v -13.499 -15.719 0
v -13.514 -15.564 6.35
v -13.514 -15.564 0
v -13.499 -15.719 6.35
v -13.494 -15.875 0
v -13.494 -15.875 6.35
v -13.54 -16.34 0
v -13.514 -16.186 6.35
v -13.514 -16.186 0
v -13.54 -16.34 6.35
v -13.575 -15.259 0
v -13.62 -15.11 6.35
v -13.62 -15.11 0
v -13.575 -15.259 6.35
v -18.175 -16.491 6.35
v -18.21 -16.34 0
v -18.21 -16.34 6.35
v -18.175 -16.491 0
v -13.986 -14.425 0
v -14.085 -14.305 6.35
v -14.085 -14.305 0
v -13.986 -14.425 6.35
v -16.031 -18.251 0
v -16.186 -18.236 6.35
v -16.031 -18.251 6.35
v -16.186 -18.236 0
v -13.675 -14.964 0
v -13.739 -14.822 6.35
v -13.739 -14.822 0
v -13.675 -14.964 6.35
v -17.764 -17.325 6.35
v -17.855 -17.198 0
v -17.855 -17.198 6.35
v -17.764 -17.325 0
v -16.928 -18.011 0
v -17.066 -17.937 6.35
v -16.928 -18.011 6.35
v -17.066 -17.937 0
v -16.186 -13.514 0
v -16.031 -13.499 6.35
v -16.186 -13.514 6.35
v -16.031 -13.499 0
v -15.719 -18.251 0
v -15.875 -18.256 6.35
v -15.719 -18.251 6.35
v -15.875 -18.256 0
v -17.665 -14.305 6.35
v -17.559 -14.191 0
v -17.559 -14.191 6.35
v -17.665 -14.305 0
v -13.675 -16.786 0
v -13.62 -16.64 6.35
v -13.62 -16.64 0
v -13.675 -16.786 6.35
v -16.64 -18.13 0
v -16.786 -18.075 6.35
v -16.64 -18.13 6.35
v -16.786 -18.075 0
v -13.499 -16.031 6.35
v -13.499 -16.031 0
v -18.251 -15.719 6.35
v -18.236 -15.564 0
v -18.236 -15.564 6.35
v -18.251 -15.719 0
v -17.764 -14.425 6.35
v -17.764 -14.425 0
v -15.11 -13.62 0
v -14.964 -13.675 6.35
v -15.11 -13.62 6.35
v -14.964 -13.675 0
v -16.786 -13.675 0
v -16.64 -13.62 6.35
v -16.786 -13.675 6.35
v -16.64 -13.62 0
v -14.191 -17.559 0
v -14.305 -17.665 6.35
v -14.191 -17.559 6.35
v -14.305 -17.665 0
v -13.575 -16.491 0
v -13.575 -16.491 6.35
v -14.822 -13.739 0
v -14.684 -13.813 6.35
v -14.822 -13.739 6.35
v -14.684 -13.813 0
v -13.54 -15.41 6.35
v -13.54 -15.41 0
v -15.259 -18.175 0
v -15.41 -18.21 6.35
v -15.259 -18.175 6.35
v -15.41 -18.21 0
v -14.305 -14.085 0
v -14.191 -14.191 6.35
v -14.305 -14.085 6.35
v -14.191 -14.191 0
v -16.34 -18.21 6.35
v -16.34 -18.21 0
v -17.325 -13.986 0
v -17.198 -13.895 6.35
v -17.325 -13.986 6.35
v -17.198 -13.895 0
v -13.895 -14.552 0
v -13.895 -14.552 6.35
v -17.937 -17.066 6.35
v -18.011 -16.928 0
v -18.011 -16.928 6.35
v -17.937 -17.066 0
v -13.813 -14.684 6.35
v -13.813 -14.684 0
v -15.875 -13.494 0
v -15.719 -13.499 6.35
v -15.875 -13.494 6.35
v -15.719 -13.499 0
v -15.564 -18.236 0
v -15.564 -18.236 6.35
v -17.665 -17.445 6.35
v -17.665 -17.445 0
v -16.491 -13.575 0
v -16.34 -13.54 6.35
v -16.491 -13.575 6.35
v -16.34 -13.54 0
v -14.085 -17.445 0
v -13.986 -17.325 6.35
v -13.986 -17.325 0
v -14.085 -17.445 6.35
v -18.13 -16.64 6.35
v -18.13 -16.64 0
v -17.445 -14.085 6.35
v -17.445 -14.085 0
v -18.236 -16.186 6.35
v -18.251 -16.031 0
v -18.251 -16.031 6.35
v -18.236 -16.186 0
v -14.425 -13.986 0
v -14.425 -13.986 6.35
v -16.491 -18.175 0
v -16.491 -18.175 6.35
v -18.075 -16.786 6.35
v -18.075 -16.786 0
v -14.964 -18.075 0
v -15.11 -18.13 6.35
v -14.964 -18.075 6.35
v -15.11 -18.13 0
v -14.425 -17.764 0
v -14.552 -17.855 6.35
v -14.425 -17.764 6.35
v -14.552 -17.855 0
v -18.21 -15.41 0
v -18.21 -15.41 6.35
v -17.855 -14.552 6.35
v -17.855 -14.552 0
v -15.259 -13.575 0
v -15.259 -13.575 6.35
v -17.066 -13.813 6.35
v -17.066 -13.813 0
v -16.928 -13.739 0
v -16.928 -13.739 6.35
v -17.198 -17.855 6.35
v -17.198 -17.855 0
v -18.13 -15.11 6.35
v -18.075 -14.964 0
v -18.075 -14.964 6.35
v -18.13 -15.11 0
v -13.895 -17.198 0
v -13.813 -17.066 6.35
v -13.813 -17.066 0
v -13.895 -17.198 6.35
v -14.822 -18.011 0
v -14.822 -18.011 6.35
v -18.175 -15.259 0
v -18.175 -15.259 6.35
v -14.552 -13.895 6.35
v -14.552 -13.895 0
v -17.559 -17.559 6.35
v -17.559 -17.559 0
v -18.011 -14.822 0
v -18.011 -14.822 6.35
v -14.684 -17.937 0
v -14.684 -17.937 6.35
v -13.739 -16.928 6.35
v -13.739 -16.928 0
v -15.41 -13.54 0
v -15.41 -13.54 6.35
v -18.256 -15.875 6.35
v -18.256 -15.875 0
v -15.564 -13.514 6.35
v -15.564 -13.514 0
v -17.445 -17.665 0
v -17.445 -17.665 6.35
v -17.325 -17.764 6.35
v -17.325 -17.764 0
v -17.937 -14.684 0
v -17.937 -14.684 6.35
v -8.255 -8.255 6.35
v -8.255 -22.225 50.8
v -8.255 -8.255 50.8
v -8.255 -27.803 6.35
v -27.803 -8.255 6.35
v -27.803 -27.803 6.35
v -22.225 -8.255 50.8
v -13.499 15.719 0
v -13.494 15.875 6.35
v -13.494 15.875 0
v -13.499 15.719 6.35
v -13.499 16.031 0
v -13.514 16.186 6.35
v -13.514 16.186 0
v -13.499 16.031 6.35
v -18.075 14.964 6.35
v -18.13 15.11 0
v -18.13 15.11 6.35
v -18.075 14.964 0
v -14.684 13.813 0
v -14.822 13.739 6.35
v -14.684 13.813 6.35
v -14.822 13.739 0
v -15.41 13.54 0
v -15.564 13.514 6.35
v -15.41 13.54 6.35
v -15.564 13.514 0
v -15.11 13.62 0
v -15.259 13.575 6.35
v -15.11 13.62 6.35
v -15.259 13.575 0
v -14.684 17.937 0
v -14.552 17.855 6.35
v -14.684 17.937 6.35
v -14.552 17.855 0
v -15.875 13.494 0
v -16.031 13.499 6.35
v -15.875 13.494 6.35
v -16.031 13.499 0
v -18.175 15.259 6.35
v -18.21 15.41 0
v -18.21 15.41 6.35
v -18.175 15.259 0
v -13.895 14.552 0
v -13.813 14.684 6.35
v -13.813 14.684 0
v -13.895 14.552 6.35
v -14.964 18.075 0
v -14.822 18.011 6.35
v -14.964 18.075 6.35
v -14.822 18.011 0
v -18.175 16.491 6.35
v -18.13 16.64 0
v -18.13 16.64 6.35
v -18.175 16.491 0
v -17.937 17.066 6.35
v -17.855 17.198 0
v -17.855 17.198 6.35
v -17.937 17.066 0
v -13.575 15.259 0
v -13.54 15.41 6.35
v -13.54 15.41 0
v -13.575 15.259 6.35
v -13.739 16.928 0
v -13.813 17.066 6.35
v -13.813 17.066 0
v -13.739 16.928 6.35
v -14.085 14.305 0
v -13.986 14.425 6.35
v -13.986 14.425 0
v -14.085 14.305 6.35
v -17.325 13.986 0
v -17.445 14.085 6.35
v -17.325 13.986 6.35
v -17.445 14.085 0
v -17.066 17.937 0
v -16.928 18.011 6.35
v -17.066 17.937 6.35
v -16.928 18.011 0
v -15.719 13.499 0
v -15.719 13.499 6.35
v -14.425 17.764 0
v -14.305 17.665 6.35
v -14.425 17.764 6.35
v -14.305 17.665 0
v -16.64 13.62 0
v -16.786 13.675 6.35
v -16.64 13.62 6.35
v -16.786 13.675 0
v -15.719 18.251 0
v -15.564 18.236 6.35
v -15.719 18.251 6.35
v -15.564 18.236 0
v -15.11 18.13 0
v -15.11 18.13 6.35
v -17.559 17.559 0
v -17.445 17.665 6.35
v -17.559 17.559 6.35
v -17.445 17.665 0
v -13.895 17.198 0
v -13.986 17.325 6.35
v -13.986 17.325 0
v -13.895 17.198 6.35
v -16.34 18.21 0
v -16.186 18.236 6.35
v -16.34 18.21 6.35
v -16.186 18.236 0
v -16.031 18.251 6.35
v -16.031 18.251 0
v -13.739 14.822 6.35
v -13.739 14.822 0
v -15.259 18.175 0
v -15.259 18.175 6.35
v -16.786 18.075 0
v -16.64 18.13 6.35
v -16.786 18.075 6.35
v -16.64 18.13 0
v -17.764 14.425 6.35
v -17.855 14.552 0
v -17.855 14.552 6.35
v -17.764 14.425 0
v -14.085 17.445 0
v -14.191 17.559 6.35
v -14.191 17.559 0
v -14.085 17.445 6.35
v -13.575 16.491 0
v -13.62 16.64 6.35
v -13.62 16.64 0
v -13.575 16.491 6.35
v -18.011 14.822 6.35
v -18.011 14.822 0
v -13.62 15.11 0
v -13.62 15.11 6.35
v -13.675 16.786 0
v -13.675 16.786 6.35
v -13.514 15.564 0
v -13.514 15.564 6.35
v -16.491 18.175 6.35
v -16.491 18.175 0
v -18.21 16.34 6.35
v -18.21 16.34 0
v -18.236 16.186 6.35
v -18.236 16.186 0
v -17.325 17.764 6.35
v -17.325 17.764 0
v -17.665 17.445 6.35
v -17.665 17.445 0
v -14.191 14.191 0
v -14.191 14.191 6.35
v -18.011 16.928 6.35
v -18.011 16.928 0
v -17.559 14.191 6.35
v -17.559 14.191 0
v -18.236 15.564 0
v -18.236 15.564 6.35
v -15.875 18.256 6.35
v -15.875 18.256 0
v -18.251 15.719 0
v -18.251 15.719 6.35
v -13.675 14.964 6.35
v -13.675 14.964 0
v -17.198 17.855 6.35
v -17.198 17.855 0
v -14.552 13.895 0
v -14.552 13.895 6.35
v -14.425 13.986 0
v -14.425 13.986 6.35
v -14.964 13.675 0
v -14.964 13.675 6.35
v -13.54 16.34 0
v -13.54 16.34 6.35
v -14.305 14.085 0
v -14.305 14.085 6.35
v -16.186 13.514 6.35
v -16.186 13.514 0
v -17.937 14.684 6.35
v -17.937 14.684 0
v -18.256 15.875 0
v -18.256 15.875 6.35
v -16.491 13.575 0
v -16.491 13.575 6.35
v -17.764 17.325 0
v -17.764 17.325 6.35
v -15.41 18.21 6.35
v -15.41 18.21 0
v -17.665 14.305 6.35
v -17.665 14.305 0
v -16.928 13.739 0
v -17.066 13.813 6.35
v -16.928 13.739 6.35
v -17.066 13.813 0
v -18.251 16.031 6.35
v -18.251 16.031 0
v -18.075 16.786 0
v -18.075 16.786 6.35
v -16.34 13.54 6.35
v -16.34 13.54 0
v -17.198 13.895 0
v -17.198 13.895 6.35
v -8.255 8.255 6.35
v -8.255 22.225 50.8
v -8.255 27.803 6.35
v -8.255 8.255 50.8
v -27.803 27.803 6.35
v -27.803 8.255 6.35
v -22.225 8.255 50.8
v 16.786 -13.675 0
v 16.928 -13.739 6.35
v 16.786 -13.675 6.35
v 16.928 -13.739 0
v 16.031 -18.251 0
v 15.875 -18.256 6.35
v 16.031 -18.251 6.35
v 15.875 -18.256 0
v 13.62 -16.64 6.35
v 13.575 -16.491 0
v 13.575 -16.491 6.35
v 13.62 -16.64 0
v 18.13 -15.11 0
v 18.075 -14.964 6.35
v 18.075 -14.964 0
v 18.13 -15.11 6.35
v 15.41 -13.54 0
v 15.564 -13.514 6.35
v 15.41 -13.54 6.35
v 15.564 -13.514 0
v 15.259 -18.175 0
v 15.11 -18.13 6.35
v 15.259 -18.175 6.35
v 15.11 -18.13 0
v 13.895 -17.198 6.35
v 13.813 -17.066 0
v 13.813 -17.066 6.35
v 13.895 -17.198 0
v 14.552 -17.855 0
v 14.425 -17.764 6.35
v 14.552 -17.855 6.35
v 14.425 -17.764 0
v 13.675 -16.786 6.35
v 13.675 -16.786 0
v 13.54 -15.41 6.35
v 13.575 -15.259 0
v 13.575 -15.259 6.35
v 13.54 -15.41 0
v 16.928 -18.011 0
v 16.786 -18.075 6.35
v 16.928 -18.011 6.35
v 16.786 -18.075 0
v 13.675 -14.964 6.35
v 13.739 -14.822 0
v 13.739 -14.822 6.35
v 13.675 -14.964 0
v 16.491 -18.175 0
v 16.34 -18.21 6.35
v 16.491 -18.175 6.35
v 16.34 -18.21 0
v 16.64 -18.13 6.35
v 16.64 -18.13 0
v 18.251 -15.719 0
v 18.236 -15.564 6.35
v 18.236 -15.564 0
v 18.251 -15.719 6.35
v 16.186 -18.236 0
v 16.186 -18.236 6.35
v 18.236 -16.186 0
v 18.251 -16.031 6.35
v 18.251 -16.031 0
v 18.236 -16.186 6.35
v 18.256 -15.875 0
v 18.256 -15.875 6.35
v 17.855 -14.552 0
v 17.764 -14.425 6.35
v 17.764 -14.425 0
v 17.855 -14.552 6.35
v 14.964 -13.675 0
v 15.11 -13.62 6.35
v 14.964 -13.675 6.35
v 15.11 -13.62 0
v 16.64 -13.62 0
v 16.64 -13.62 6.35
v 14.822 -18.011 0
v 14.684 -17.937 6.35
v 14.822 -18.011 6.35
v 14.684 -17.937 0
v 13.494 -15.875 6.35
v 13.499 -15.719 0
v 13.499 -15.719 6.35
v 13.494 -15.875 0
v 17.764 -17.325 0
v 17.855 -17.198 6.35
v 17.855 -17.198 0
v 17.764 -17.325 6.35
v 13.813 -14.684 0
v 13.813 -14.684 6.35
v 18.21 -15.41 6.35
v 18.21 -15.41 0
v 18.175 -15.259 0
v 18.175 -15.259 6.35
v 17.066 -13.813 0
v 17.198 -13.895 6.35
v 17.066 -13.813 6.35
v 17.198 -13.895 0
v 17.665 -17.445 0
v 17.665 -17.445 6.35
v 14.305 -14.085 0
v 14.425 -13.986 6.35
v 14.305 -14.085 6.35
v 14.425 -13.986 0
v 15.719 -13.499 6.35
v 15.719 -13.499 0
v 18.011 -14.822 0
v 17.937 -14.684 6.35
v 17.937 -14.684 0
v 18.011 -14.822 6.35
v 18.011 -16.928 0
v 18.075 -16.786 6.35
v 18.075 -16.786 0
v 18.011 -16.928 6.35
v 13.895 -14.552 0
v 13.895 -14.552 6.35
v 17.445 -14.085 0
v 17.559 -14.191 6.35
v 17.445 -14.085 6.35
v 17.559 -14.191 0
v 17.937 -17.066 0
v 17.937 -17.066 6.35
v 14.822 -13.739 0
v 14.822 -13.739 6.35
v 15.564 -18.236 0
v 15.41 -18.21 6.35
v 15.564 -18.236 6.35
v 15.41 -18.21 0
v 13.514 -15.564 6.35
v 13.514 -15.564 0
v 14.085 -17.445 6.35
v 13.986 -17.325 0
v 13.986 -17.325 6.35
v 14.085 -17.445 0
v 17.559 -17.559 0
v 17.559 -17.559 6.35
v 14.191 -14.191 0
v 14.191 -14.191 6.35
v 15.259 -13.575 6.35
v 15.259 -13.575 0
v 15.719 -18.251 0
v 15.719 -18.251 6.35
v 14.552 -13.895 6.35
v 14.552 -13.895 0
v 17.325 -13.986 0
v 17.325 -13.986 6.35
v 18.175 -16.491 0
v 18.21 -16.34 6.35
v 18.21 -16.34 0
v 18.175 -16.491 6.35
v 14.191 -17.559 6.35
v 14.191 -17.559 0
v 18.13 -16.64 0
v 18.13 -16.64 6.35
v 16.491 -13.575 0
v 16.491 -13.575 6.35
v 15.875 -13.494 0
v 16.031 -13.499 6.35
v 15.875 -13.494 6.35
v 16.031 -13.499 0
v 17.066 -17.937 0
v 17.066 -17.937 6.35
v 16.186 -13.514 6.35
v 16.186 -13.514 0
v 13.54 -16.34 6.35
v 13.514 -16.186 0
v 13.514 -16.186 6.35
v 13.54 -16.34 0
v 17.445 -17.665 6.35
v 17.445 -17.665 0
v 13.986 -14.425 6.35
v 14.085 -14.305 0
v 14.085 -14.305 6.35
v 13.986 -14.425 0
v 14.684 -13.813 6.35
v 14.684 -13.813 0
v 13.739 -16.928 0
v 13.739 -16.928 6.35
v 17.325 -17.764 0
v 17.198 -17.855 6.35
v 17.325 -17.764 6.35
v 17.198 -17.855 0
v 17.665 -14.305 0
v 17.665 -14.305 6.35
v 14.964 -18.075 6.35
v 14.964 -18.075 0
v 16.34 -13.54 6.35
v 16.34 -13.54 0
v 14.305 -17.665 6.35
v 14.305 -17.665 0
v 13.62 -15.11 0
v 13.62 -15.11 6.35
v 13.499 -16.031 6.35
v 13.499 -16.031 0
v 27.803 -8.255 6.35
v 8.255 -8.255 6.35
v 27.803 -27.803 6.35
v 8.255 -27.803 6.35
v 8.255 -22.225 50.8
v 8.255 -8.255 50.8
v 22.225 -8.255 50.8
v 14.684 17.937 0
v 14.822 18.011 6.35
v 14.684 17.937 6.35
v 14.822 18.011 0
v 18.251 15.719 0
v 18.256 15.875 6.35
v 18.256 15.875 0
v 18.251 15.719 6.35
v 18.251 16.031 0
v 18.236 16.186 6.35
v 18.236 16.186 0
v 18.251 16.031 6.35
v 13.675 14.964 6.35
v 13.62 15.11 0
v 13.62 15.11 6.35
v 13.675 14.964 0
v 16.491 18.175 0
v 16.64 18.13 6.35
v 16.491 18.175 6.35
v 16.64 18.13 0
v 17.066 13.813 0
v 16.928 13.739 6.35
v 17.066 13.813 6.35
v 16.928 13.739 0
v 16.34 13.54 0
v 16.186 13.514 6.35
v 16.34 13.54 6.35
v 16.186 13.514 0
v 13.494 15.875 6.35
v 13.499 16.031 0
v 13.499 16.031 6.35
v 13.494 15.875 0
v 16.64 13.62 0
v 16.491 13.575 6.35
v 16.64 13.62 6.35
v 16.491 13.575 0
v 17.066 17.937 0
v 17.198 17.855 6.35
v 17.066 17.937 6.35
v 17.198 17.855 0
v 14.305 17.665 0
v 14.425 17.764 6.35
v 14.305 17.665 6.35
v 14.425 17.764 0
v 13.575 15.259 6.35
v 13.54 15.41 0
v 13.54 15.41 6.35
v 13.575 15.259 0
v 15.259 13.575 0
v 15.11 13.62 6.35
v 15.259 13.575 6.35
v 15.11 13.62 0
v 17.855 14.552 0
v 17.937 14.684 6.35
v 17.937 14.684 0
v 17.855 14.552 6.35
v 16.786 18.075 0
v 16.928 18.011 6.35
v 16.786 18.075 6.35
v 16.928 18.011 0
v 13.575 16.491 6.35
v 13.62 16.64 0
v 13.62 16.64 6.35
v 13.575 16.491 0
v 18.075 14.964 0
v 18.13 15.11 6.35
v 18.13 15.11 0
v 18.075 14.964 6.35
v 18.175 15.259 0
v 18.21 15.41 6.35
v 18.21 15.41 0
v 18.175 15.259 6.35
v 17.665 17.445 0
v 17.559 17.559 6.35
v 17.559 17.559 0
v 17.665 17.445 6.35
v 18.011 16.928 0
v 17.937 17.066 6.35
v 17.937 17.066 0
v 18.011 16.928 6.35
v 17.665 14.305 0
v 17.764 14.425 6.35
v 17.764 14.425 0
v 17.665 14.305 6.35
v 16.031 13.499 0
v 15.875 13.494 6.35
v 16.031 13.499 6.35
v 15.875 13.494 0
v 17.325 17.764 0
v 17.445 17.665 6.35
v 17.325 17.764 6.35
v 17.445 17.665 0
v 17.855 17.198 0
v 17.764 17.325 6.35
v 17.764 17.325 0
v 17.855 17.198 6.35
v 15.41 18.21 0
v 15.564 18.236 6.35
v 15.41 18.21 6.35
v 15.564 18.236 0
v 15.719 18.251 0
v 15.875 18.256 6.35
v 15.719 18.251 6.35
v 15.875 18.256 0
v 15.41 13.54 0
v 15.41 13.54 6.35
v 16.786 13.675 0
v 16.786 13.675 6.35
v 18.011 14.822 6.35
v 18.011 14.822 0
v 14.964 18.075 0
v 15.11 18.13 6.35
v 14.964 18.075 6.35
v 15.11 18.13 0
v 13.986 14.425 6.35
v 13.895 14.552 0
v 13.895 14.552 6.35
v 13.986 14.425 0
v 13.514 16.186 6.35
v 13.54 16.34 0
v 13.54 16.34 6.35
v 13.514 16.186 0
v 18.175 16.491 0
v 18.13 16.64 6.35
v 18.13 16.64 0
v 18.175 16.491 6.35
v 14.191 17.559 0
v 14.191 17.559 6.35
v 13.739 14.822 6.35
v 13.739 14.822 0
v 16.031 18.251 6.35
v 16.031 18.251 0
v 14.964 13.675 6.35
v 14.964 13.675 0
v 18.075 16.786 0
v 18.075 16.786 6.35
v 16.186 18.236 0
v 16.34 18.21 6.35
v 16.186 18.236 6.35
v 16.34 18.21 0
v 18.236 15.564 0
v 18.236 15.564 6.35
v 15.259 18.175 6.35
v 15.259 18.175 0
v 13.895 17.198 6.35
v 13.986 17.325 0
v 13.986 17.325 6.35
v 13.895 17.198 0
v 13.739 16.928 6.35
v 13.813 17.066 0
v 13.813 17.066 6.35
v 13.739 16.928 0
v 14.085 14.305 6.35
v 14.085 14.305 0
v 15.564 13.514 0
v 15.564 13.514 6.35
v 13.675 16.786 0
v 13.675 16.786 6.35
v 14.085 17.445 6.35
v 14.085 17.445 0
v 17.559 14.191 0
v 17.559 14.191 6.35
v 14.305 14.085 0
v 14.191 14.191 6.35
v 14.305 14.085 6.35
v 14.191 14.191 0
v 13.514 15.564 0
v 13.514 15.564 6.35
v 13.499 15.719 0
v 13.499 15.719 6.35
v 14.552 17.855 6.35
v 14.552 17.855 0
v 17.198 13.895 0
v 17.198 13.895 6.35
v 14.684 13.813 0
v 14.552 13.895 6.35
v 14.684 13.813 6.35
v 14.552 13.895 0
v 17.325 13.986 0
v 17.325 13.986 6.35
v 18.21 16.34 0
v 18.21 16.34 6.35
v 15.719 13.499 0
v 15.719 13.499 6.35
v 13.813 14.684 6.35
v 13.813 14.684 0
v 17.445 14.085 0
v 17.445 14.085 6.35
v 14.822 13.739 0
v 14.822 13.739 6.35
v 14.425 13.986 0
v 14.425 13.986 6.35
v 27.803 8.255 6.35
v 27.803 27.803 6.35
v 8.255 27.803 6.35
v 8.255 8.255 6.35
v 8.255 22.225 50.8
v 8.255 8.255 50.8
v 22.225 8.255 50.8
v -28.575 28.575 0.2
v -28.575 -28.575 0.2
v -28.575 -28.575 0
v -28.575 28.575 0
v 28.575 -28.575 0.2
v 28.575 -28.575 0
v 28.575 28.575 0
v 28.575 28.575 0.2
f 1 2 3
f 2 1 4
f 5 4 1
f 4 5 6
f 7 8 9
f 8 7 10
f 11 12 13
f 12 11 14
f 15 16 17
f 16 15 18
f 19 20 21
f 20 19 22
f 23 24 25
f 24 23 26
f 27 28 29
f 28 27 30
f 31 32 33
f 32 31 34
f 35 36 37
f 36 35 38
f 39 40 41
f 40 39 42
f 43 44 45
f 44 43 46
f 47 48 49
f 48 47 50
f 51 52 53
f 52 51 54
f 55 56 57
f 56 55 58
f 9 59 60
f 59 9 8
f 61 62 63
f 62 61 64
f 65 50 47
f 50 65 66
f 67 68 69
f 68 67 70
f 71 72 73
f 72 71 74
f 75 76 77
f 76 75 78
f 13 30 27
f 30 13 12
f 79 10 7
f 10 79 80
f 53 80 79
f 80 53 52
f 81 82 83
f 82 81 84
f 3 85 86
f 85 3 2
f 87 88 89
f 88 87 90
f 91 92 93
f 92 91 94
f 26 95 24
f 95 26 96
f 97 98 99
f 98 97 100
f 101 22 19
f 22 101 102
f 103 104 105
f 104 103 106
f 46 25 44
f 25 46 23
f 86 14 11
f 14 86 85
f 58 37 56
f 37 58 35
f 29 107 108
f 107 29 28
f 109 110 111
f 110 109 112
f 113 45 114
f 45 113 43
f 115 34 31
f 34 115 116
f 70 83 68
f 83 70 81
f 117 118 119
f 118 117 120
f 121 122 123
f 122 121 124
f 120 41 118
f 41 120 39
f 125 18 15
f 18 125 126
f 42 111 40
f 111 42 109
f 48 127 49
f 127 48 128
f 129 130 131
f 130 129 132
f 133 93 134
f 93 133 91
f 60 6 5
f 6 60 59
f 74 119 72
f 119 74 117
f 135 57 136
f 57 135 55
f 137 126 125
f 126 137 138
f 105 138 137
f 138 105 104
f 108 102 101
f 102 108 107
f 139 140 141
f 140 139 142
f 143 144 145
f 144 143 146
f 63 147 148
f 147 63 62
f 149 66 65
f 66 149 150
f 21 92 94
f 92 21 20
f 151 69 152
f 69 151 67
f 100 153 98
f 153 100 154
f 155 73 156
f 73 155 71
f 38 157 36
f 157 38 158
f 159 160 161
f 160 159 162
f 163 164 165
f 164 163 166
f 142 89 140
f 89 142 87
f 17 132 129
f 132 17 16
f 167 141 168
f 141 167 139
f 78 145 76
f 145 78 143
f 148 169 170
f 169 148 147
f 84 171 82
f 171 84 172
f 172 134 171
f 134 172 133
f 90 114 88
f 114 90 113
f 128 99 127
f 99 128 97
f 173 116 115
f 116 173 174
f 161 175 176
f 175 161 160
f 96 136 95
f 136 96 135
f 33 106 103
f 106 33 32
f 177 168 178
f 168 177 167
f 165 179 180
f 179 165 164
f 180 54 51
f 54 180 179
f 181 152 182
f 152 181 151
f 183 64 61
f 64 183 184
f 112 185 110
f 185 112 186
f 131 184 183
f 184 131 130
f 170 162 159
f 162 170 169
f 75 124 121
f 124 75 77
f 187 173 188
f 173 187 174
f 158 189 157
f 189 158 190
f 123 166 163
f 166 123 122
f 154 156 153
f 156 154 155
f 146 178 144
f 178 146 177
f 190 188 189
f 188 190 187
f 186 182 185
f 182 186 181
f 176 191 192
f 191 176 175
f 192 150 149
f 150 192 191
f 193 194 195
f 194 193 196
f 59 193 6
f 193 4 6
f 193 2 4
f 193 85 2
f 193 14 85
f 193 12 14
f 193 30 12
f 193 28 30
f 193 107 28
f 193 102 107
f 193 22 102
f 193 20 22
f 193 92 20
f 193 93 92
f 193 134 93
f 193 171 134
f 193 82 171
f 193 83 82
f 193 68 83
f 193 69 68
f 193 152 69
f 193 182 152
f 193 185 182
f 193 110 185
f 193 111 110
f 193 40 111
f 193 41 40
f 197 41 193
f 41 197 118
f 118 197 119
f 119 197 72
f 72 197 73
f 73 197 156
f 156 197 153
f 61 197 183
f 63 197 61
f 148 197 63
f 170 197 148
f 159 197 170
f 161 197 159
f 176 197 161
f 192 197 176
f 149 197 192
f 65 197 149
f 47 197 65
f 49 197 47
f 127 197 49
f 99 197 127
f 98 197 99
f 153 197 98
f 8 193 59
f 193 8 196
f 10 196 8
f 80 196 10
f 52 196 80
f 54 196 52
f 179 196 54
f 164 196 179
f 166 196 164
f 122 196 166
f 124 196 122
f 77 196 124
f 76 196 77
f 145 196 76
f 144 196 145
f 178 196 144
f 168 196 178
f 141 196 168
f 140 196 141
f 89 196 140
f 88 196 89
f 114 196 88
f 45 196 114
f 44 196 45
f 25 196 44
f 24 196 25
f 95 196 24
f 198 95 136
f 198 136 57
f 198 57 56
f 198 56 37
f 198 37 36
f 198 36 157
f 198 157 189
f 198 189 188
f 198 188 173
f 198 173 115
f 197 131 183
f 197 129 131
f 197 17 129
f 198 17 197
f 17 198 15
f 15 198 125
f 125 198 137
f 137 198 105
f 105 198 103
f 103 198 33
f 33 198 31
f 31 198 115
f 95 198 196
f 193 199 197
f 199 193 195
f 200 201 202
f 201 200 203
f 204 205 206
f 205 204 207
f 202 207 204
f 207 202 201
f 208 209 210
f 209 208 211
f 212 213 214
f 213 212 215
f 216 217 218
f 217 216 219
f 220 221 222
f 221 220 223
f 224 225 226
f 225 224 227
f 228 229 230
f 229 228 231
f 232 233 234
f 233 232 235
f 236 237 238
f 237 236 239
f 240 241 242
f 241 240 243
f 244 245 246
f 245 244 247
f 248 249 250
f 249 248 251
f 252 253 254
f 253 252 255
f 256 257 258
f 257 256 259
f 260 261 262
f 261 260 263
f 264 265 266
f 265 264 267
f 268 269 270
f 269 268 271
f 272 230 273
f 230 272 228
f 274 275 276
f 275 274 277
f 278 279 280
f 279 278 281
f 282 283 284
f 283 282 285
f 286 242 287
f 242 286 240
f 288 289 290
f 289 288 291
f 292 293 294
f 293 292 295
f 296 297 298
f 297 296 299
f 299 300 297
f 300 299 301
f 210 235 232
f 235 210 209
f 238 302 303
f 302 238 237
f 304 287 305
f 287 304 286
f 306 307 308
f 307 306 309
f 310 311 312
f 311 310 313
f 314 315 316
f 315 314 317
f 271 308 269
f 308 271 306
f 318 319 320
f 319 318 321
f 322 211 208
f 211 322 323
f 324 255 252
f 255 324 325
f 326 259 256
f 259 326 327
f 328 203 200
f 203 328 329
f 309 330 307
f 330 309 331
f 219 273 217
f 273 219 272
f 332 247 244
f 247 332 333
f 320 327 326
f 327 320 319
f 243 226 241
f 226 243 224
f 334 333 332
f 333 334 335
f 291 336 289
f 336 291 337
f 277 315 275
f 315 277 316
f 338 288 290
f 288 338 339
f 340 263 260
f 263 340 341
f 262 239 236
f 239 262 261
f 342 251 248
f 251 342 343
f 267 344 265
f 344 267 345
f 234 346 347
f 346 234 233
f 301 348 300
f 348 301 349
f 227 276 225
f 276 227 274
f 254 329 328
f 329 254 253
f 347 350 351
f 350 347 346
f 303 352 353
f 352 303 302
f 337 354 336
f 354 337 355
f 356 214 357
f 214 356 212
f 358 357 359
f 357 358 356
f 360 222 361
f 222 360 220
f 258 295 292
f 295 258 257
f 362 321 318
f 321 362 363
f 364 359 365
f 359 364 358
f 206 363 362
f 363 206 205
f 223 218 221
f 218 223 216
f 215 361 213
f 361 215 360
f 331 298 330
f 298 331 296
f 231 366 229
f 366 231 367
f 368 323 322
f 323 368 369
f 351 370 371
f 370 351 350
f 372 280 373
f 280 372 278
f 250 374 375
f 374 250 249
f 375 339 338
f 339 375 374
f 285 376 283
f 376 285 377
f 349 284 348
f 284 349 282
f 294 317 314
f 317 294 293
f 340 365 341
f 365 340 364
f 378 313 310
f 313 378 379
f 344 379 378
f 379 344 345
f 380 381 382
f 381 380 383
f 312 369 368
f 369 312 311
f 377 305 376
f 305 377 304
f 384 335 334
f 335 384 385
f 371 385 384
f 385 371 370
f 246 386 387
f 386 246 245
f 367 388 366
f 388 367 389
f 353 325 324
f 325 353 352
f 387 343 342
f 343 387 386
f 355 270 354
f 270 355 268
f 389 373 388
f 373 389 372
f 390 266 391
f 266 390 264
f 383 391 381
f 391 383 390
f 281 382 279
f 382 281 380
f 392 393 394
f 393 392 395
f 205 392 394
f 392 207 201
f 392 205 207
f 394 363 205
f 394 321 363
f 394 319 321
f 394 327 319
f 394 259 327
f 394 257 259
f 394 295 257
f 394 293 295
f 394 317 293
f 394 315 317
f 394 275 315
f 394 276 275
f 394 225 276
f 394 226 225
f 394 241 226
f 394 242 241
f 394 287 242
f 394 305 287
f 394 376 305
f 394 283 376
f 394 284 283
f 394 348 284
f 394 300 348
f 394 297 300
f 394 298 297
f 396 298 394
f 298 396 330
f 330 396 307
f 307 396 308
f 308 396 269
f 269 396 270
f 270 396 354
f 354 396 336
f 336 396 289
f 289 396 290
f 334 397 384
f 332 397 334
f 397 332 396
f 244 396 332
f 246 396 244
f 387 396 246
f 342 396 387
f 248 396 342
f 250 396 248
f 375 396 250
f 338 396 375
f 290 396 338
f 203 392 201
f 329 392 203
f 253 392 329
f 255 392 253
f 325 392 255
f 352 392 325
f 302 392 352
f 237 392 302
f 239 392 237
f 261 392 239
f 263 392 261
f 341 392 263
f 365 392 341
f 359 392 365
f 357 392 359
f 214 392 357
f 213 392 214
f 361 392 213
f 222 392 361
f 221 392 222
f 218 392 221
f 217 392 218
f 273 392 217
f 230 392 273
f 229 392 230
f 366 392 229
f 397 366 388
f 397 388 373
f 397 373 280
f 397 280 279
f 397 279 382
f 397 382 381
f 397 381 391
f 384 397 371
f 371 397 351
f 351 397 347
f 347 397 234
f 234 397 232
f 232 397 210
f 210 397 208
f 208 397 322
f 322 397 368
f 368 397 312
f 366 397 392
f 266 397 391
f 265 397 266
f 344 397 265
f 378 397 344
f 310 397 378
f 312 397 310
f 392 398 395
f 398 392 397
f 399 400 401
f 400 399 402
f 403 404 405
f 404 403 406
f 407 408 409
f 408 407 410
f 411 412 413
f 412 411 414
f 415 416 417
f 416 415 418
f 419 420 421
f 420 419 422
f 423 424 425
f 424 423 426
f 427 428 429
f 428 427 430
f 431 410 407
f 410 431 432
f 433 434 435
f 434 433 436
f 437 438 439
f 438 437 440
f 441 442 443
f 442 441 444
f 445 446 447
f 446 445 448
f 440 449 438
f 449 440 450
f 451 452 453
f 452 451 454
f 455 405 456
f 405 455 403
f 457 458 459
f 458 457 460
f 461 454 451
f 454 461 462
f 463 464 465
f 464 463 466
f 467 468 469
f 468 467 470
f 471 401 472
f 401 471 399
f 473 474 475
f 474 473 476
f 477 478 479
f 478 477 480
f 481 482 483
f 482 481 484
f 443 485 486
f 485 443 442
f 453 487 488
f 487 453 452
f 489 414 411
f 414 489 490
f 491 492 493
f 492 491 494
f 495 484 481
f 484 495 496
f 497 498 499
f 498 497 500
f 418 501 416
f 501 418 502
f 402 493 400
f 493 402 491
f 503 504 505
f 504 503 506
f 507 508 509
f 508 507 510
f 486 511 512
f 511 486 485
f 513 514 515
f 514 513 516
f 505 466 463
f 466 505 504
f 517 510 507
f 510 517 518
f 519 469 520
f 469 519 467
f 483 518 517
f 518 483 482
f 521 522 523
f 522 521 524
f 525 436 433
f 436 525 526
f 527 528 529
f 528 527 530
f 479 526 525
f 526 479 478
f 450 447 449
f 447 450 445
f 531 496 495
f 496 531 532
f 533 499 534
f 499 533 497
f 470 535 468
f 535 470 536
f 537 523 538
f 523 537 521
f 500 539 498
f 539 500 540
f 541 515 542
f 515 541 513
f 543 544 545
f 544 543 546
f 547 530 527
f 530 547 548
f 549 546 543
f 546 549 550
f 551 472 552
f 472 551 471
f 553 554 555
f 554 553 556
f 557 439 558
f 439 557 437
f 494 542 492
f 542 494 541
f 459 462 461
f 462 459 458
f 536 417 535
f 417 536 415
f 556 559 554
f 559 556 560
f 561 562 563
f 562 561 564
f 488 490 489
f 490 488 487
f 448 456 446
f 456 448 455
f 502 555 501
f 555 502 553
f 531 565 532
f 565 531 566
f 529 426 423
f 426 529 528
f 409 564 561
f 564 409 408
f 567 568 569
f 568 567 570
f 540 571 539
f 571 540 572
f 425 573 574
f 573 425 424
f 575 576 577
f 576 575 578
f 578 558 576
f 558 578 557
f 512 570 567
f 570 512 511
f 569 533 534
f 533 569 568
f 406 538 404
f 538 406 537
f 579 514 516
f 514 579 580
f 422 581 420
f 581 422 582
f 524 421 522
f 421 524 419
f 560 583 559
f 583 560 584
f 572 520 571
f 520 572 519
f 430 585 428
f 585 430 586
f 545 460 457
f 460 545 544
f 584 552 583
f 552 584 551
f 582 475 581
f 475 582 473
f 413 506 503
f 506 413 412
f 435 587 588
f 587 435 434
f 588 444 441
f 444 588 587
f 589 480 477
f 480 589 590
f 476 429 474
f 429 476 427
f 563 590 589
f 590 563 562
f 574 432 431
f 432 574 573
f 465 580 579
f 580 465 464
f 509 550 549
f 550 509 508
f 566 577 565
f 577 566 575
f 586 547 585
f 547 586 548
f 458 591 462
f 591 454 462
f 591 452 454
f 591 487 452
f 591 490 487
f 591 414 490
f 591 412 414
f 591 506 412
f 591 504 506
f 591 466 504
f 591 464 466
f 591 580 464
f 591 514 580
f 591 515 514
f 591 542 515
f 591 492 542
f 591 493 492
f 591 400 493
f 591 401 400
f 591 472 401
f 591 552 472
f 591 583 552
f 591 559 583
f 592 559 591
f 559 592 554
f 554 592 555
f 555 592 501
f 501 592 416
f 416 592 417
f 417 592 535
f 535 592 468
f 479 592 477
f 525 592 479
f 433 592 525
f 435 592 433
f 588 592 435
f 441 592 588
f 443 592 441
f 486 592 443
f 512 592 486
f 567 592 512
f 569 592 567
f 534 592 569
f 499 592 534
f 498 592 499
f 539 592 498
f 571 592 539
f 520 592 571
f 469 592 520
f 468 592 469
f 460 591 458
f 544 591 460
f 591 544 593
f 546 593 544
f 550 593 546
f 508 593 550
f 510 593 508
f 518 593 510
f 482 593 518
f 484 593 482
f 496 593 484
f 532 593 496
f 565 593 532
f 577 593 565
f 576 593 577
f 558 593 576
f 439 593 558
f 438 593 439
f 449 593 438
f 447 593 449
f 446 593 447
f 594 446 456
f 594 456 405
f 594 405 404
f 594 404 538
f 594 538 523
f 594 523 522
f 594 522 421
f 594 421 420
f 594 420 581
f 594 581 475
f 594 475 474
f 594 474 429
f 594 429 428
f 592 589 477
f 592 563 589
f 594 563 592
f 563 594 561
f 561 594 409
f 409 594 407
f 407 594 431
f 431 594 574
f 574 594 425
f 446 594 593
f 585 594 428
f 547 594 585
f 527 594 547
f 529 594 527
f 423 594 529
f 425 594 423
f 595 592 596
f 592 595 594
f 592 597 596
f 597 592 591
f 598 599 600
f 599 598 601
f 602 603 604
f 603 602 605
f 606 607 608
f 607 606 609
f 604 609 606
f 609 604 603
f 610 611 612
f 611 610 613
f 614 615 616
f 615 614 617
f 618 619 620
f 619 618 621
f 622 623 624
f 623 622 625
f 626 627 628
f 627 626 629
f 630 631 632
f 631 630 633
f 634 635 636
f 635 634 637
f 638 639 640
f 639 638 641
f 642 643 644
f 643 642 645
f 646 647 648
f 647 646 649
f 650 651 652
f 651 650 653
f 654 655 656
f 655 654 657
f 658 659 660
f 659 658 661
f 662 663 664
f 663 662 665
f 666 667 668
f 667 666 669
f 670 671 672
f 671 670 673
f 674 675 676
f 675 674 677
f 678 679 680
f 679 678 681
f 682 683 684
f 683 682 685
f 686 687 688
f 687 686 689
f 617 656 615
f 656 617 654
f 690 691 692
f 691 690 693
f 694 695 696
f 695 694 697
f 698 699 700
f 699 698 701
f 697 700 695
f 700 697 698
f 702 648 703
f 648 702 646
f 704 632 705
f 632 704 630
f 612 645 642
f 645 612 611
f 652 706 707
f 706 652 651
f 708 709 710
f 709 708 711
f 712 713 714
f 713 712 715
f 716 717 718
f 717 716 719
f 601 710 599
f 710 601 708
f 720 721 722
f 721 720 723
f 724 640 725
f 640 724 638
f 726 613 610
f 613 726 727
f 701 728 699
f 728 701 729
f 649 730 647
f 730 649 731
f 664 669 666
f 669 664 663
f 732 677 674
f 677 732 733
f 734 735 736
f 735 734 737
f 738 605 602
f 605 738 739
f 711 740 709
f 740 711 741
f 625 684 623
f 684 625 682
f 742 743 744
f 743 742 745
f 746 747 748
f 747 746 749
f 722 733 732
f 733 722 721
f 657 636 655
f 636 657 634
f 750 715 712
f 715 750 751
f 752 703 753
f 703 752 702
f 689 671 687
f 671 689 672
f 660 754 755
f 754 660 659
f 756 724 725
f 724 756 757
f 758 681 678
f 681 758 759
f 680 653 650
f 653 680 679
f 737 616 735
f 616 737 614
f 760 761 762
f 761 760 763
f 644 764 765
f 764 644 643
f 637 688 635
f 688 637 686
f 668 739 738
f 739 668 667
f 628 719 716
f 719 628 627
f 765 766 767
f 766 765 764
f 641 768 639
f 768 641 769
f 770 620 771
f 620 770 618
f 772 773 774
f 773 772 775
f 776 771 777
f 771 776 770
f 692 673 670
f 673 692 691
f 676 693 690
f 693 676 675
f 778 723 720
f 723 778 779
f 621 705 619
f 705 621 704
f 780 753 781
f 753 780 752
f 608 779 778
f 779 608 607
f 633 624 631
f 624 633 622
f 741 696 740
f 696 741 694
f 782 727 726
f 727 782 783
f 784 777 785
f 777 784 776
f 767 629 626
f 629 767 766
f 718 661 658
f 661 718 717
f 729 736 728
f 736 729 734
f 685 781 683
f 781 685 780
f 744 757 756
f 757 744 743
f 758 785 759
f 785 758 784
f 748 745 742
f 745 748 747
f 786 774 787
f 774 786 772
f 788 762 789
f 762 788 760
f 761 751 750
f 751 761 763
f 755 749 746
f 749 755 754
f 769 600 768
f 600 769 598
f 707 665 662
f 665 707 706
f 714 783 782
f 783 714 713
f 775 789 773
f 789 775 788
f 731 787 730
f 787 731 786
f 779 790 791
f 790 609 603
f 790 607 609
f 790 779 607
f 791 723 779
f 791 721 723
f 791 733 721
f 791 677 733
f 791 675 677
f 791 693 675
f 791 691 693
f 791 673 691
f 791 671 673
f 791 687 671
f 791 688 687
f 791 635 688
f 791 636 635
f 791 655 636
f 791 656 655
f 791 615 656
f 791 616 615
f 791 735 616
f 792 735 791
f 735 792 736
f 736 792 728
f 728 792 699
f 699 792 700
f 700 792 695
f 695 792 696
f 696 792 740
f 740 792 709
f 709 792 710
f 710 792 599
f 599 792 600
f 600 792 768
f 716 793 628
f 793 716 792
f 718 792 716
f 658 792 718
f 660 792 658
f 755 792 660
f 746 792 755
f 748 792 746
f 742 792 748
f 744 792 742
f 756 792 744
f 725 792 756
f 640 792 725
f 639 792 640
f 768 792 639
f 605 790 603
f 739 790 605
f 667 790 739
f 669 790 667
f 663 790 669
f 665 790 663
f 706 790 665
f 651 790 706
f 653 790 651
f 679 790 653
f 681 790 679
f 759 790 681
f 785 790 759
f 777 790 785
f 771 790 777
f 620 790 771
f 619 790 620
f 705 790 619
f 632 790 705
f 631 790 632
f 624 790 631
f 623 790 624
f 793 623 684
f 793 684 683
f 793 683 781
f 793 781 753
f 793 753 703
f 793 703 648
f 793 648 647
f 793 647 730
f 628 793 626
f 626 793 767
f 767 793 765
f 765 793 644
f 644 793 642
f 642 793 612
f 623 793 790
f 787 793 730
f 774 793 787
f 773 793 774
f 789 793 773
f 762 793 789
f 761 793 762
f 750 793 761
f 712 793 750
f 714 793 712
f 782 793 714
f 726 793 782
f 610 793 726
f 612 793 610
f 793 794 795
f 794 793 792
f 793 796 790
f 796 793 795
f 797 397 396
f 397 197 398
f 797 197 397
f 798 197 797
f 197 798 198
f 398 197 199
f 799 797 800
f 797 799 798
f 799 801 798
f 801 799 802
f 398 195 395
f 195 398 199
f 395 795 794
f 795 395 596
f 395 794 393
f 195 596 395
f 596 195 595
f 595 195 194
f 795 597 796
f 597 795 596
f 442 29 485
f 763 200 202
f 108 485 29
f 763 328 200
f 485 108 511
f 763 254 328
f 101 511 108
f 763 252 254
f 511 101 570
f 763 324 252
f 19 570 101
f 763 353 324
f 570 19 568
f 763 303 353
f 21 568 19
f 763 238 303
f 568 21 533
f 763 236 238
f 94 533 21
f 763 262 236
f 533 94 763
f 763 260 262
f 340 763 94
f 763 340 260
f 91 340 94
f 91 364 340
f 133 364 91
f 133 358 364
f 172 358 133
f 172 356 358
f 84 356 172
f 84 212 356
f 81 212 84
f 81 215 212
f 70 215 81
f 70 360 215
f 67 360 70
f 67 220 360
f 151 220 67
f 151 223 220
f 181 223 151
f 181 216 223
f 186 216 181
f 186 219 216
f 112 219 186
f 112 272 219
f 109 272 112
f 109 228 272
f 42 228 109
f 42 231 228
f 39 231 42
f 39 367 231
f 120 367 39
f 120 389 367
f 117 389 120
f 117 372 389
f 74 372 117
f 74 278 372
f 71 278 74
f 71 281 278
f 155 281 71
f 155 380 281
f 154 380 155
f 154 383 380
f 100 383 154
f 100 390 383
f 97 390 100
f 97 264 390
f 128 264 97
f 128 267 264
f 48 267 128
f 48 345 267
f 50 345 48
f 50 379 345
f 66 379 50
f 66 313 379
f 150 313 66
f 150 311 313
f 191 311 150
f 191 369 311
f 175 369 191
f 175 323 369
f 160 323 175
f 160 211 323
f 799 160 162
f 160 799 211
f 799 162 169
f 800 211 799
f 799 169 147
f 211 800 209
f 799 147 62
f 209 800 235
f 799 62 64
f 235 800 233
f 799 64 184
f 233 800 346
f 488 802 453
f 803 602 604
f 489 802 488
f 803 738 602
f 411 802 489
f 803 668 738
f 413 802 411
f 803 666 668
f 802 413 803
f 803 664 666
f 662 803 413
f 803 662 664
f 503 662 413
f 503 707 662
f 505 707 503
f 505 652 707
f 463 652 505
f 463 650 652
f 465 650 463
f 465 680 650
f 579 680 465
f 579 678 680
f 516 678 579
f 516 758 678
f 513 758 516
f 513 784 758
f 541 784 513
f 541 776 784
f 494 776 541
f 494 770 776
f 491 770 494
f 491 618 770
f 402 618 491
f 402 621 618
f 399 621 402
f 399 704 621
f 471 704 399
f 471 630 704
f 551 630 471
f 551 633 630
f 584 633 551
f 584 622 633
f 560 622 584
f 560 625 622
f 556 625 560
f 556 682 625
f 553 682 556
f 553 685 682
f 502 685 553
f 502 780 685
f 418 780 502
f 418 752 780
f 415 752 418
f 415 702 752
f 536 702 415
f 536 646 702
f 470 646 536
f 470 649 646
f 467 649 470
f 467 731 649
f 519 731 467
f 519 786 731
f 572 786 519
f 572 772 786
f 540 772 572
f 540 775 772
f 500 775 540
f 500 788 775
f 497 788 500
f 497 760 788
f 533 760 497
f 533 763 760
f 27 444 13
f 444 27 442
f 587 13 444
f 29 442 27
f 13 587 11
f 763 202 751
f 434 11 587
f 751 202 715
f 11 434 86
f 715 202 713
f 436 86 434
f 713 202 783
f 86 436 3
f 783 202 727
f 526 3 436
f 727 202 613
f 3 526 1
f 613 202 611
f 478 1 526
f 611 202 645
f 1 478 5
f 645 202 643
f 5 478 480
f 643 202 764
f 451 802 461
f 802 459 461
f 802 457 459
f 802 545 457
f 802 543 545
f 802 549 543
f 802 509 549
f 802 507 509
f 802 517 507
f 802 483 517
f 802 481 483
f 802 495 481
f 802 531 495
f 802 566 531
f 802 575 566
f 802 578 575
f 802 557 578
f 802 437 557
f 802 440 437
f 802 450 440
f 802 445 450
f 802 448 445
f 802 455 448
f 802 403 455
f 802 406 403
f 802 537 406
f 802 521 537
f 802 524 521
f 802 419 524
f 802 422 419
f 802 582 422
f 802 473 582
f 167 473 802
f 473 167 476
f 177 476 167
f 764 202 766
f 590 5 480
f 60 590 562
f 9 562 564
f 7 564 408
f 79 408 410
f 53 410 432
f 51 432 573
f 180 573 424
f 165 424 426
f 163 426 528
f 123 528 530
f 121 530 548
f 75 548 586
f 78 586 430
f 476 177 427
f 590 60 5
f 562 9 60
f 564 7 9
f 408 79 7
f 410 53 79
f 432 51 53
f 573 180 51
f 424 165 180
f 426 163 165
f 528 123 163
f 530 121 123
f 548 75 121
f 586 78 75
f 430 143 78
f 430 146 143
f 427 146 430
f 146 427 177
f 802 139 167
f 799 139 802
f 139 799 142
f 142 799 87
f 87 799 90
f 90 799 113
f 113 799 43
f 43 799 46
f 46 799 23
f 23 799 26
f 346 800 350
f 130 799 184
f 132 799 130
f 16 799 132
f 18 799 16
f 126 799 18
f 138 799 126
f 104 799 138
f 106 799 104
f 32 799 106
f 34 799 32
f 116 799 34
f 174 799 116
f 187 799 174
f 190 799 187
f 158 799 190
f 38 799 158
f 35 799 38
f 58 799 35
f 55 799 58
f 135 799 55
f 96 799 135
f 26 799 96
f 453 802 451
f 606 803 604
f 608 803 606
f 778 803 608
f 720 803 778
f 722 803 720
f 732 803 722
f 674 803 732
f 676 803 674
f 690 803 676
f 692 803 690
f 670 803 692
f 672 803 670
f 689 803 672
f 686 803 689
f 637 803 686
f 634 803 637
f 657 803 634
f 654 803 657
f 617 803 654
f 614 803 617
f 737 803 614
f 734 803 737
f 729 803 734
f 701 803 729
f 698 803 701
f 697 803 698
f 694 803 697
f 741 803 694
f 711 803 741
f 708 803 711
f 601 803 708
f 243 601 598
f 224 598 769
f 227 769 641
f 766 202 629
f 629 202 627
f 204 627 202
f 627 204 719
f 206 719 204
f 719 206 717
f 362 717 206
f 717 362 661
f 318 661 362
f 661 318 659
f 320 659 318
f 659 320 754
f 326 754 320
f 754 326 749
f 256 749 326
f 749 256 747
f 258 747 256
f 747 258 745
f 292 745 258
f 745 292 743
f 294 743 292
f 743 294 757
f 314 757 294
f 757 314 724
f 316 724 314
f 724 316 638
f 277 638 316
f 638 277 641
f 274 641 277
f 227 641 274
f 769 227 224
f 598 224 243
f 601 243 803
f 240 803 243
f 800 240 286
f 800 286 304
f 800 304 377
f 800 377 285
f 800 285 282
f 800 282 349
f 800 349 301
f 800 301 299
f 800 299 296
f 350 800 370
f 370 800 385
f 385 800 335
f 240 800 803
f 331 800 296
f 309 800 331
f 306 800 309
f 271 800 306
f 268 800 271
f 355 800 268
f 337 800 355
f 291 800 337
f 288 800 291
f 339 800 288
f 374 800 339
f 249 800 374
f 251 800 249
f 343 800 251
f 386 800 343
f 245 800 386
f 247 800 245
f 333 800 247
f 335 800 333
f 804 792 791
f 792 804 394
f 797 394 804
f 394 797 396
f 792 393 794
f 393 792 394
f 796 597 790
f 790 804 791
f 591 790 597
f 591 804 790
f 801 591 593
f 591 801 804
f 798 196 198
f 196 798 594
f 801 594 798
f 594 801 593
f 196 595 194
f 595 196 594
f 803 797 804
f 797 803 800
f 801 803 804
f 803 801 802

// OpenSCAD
// Tapered cabinet support with open screw-access corners
// OpenSCAD units are millimeters.
//
// Geometry:
// - Face A (bottom): 2.25" x 2.25"
// - Opposite face (top): 1.00" x 1.00"
// - Total height: 1.50"
// - Four mounting holes: 1.25" center-to-center
// - 3/16" diameter holes through the first 0.25" from Face A
// - Above the flange, each corner is opened for screw-head/driver access

inch = 25.4;

base_size       = 2.25 * inch;
top_size        = 1.75 * inch;
total_height    = 2.0 * inch;

flange_height   = 0.25 * inch;

hole_spacing    = 1.25 * inch;
mount_hole_dia  = 3/16 * inch;

// Corner opening sized for approximately 1/2" screw-head clearance.
// Increase this if your actual screw heads or driver need more room.
head_clearance_dia = 0.60 * inch;
head_clearance_rad = head_clearance_dia / 2;

epsilon = 0.20;
$fn = 96;

// Centered square frustum.
module tapered_square_frustum() {
    hull() {
        translate([0, 0, 0])
            linear_extrude(height = epsilon)
                square([base_size, base_size], center = true);

        translate([0, 0, total_height - epsilon])
            linear_extrude(height = epsilon)
                square([top_size, top_size], center = true);
    }
}

// Removes the upper portion of one corner to expose the screw head.
// sx and sy are each -1 or +1.
module corner_relief(sx, sy) {
    hole_x = sx * hole_spacing / 2;
    hole_y = sy * hole_spacing / 2;

    x_start = sx > 0 ? hole_x - head_clearance_rad : -base_size;
    x_end   = sx > 0 ? base_size : hole_x + head_clearance_rad;

    y_start = sy > 0 ? hole_y - head_clearance_rad : -base_size;
    y_end   = sy > 0 ? base_size : hole_y + head_clearance_rad;

    translate([x_start, y_start, flange_height])
        cube([
            x_end - x_start,
            y_end - y_start,
            total_height - flange_height + epsilon
        ]);
}

difference() {
    tapered_square_frustum();

    for (sx = [-1, 1])
        for (sy = [-1, 1]) {
            hole_x = sx * hole_spacing / 2;
            hole_y = sy * hole_spacing / 2;

            // 3/16" mounting hole through only the 0.25" flange.
            translate([hole_x, hole_y, -epsilon])
                cylinder(
                    h = flange_height + 2 * epsilon,
                    d = mount_hole_dia
                );

            // Open the upper corner for screw-head and driver access.
            corner_relief(sx, sy);
        }
}
